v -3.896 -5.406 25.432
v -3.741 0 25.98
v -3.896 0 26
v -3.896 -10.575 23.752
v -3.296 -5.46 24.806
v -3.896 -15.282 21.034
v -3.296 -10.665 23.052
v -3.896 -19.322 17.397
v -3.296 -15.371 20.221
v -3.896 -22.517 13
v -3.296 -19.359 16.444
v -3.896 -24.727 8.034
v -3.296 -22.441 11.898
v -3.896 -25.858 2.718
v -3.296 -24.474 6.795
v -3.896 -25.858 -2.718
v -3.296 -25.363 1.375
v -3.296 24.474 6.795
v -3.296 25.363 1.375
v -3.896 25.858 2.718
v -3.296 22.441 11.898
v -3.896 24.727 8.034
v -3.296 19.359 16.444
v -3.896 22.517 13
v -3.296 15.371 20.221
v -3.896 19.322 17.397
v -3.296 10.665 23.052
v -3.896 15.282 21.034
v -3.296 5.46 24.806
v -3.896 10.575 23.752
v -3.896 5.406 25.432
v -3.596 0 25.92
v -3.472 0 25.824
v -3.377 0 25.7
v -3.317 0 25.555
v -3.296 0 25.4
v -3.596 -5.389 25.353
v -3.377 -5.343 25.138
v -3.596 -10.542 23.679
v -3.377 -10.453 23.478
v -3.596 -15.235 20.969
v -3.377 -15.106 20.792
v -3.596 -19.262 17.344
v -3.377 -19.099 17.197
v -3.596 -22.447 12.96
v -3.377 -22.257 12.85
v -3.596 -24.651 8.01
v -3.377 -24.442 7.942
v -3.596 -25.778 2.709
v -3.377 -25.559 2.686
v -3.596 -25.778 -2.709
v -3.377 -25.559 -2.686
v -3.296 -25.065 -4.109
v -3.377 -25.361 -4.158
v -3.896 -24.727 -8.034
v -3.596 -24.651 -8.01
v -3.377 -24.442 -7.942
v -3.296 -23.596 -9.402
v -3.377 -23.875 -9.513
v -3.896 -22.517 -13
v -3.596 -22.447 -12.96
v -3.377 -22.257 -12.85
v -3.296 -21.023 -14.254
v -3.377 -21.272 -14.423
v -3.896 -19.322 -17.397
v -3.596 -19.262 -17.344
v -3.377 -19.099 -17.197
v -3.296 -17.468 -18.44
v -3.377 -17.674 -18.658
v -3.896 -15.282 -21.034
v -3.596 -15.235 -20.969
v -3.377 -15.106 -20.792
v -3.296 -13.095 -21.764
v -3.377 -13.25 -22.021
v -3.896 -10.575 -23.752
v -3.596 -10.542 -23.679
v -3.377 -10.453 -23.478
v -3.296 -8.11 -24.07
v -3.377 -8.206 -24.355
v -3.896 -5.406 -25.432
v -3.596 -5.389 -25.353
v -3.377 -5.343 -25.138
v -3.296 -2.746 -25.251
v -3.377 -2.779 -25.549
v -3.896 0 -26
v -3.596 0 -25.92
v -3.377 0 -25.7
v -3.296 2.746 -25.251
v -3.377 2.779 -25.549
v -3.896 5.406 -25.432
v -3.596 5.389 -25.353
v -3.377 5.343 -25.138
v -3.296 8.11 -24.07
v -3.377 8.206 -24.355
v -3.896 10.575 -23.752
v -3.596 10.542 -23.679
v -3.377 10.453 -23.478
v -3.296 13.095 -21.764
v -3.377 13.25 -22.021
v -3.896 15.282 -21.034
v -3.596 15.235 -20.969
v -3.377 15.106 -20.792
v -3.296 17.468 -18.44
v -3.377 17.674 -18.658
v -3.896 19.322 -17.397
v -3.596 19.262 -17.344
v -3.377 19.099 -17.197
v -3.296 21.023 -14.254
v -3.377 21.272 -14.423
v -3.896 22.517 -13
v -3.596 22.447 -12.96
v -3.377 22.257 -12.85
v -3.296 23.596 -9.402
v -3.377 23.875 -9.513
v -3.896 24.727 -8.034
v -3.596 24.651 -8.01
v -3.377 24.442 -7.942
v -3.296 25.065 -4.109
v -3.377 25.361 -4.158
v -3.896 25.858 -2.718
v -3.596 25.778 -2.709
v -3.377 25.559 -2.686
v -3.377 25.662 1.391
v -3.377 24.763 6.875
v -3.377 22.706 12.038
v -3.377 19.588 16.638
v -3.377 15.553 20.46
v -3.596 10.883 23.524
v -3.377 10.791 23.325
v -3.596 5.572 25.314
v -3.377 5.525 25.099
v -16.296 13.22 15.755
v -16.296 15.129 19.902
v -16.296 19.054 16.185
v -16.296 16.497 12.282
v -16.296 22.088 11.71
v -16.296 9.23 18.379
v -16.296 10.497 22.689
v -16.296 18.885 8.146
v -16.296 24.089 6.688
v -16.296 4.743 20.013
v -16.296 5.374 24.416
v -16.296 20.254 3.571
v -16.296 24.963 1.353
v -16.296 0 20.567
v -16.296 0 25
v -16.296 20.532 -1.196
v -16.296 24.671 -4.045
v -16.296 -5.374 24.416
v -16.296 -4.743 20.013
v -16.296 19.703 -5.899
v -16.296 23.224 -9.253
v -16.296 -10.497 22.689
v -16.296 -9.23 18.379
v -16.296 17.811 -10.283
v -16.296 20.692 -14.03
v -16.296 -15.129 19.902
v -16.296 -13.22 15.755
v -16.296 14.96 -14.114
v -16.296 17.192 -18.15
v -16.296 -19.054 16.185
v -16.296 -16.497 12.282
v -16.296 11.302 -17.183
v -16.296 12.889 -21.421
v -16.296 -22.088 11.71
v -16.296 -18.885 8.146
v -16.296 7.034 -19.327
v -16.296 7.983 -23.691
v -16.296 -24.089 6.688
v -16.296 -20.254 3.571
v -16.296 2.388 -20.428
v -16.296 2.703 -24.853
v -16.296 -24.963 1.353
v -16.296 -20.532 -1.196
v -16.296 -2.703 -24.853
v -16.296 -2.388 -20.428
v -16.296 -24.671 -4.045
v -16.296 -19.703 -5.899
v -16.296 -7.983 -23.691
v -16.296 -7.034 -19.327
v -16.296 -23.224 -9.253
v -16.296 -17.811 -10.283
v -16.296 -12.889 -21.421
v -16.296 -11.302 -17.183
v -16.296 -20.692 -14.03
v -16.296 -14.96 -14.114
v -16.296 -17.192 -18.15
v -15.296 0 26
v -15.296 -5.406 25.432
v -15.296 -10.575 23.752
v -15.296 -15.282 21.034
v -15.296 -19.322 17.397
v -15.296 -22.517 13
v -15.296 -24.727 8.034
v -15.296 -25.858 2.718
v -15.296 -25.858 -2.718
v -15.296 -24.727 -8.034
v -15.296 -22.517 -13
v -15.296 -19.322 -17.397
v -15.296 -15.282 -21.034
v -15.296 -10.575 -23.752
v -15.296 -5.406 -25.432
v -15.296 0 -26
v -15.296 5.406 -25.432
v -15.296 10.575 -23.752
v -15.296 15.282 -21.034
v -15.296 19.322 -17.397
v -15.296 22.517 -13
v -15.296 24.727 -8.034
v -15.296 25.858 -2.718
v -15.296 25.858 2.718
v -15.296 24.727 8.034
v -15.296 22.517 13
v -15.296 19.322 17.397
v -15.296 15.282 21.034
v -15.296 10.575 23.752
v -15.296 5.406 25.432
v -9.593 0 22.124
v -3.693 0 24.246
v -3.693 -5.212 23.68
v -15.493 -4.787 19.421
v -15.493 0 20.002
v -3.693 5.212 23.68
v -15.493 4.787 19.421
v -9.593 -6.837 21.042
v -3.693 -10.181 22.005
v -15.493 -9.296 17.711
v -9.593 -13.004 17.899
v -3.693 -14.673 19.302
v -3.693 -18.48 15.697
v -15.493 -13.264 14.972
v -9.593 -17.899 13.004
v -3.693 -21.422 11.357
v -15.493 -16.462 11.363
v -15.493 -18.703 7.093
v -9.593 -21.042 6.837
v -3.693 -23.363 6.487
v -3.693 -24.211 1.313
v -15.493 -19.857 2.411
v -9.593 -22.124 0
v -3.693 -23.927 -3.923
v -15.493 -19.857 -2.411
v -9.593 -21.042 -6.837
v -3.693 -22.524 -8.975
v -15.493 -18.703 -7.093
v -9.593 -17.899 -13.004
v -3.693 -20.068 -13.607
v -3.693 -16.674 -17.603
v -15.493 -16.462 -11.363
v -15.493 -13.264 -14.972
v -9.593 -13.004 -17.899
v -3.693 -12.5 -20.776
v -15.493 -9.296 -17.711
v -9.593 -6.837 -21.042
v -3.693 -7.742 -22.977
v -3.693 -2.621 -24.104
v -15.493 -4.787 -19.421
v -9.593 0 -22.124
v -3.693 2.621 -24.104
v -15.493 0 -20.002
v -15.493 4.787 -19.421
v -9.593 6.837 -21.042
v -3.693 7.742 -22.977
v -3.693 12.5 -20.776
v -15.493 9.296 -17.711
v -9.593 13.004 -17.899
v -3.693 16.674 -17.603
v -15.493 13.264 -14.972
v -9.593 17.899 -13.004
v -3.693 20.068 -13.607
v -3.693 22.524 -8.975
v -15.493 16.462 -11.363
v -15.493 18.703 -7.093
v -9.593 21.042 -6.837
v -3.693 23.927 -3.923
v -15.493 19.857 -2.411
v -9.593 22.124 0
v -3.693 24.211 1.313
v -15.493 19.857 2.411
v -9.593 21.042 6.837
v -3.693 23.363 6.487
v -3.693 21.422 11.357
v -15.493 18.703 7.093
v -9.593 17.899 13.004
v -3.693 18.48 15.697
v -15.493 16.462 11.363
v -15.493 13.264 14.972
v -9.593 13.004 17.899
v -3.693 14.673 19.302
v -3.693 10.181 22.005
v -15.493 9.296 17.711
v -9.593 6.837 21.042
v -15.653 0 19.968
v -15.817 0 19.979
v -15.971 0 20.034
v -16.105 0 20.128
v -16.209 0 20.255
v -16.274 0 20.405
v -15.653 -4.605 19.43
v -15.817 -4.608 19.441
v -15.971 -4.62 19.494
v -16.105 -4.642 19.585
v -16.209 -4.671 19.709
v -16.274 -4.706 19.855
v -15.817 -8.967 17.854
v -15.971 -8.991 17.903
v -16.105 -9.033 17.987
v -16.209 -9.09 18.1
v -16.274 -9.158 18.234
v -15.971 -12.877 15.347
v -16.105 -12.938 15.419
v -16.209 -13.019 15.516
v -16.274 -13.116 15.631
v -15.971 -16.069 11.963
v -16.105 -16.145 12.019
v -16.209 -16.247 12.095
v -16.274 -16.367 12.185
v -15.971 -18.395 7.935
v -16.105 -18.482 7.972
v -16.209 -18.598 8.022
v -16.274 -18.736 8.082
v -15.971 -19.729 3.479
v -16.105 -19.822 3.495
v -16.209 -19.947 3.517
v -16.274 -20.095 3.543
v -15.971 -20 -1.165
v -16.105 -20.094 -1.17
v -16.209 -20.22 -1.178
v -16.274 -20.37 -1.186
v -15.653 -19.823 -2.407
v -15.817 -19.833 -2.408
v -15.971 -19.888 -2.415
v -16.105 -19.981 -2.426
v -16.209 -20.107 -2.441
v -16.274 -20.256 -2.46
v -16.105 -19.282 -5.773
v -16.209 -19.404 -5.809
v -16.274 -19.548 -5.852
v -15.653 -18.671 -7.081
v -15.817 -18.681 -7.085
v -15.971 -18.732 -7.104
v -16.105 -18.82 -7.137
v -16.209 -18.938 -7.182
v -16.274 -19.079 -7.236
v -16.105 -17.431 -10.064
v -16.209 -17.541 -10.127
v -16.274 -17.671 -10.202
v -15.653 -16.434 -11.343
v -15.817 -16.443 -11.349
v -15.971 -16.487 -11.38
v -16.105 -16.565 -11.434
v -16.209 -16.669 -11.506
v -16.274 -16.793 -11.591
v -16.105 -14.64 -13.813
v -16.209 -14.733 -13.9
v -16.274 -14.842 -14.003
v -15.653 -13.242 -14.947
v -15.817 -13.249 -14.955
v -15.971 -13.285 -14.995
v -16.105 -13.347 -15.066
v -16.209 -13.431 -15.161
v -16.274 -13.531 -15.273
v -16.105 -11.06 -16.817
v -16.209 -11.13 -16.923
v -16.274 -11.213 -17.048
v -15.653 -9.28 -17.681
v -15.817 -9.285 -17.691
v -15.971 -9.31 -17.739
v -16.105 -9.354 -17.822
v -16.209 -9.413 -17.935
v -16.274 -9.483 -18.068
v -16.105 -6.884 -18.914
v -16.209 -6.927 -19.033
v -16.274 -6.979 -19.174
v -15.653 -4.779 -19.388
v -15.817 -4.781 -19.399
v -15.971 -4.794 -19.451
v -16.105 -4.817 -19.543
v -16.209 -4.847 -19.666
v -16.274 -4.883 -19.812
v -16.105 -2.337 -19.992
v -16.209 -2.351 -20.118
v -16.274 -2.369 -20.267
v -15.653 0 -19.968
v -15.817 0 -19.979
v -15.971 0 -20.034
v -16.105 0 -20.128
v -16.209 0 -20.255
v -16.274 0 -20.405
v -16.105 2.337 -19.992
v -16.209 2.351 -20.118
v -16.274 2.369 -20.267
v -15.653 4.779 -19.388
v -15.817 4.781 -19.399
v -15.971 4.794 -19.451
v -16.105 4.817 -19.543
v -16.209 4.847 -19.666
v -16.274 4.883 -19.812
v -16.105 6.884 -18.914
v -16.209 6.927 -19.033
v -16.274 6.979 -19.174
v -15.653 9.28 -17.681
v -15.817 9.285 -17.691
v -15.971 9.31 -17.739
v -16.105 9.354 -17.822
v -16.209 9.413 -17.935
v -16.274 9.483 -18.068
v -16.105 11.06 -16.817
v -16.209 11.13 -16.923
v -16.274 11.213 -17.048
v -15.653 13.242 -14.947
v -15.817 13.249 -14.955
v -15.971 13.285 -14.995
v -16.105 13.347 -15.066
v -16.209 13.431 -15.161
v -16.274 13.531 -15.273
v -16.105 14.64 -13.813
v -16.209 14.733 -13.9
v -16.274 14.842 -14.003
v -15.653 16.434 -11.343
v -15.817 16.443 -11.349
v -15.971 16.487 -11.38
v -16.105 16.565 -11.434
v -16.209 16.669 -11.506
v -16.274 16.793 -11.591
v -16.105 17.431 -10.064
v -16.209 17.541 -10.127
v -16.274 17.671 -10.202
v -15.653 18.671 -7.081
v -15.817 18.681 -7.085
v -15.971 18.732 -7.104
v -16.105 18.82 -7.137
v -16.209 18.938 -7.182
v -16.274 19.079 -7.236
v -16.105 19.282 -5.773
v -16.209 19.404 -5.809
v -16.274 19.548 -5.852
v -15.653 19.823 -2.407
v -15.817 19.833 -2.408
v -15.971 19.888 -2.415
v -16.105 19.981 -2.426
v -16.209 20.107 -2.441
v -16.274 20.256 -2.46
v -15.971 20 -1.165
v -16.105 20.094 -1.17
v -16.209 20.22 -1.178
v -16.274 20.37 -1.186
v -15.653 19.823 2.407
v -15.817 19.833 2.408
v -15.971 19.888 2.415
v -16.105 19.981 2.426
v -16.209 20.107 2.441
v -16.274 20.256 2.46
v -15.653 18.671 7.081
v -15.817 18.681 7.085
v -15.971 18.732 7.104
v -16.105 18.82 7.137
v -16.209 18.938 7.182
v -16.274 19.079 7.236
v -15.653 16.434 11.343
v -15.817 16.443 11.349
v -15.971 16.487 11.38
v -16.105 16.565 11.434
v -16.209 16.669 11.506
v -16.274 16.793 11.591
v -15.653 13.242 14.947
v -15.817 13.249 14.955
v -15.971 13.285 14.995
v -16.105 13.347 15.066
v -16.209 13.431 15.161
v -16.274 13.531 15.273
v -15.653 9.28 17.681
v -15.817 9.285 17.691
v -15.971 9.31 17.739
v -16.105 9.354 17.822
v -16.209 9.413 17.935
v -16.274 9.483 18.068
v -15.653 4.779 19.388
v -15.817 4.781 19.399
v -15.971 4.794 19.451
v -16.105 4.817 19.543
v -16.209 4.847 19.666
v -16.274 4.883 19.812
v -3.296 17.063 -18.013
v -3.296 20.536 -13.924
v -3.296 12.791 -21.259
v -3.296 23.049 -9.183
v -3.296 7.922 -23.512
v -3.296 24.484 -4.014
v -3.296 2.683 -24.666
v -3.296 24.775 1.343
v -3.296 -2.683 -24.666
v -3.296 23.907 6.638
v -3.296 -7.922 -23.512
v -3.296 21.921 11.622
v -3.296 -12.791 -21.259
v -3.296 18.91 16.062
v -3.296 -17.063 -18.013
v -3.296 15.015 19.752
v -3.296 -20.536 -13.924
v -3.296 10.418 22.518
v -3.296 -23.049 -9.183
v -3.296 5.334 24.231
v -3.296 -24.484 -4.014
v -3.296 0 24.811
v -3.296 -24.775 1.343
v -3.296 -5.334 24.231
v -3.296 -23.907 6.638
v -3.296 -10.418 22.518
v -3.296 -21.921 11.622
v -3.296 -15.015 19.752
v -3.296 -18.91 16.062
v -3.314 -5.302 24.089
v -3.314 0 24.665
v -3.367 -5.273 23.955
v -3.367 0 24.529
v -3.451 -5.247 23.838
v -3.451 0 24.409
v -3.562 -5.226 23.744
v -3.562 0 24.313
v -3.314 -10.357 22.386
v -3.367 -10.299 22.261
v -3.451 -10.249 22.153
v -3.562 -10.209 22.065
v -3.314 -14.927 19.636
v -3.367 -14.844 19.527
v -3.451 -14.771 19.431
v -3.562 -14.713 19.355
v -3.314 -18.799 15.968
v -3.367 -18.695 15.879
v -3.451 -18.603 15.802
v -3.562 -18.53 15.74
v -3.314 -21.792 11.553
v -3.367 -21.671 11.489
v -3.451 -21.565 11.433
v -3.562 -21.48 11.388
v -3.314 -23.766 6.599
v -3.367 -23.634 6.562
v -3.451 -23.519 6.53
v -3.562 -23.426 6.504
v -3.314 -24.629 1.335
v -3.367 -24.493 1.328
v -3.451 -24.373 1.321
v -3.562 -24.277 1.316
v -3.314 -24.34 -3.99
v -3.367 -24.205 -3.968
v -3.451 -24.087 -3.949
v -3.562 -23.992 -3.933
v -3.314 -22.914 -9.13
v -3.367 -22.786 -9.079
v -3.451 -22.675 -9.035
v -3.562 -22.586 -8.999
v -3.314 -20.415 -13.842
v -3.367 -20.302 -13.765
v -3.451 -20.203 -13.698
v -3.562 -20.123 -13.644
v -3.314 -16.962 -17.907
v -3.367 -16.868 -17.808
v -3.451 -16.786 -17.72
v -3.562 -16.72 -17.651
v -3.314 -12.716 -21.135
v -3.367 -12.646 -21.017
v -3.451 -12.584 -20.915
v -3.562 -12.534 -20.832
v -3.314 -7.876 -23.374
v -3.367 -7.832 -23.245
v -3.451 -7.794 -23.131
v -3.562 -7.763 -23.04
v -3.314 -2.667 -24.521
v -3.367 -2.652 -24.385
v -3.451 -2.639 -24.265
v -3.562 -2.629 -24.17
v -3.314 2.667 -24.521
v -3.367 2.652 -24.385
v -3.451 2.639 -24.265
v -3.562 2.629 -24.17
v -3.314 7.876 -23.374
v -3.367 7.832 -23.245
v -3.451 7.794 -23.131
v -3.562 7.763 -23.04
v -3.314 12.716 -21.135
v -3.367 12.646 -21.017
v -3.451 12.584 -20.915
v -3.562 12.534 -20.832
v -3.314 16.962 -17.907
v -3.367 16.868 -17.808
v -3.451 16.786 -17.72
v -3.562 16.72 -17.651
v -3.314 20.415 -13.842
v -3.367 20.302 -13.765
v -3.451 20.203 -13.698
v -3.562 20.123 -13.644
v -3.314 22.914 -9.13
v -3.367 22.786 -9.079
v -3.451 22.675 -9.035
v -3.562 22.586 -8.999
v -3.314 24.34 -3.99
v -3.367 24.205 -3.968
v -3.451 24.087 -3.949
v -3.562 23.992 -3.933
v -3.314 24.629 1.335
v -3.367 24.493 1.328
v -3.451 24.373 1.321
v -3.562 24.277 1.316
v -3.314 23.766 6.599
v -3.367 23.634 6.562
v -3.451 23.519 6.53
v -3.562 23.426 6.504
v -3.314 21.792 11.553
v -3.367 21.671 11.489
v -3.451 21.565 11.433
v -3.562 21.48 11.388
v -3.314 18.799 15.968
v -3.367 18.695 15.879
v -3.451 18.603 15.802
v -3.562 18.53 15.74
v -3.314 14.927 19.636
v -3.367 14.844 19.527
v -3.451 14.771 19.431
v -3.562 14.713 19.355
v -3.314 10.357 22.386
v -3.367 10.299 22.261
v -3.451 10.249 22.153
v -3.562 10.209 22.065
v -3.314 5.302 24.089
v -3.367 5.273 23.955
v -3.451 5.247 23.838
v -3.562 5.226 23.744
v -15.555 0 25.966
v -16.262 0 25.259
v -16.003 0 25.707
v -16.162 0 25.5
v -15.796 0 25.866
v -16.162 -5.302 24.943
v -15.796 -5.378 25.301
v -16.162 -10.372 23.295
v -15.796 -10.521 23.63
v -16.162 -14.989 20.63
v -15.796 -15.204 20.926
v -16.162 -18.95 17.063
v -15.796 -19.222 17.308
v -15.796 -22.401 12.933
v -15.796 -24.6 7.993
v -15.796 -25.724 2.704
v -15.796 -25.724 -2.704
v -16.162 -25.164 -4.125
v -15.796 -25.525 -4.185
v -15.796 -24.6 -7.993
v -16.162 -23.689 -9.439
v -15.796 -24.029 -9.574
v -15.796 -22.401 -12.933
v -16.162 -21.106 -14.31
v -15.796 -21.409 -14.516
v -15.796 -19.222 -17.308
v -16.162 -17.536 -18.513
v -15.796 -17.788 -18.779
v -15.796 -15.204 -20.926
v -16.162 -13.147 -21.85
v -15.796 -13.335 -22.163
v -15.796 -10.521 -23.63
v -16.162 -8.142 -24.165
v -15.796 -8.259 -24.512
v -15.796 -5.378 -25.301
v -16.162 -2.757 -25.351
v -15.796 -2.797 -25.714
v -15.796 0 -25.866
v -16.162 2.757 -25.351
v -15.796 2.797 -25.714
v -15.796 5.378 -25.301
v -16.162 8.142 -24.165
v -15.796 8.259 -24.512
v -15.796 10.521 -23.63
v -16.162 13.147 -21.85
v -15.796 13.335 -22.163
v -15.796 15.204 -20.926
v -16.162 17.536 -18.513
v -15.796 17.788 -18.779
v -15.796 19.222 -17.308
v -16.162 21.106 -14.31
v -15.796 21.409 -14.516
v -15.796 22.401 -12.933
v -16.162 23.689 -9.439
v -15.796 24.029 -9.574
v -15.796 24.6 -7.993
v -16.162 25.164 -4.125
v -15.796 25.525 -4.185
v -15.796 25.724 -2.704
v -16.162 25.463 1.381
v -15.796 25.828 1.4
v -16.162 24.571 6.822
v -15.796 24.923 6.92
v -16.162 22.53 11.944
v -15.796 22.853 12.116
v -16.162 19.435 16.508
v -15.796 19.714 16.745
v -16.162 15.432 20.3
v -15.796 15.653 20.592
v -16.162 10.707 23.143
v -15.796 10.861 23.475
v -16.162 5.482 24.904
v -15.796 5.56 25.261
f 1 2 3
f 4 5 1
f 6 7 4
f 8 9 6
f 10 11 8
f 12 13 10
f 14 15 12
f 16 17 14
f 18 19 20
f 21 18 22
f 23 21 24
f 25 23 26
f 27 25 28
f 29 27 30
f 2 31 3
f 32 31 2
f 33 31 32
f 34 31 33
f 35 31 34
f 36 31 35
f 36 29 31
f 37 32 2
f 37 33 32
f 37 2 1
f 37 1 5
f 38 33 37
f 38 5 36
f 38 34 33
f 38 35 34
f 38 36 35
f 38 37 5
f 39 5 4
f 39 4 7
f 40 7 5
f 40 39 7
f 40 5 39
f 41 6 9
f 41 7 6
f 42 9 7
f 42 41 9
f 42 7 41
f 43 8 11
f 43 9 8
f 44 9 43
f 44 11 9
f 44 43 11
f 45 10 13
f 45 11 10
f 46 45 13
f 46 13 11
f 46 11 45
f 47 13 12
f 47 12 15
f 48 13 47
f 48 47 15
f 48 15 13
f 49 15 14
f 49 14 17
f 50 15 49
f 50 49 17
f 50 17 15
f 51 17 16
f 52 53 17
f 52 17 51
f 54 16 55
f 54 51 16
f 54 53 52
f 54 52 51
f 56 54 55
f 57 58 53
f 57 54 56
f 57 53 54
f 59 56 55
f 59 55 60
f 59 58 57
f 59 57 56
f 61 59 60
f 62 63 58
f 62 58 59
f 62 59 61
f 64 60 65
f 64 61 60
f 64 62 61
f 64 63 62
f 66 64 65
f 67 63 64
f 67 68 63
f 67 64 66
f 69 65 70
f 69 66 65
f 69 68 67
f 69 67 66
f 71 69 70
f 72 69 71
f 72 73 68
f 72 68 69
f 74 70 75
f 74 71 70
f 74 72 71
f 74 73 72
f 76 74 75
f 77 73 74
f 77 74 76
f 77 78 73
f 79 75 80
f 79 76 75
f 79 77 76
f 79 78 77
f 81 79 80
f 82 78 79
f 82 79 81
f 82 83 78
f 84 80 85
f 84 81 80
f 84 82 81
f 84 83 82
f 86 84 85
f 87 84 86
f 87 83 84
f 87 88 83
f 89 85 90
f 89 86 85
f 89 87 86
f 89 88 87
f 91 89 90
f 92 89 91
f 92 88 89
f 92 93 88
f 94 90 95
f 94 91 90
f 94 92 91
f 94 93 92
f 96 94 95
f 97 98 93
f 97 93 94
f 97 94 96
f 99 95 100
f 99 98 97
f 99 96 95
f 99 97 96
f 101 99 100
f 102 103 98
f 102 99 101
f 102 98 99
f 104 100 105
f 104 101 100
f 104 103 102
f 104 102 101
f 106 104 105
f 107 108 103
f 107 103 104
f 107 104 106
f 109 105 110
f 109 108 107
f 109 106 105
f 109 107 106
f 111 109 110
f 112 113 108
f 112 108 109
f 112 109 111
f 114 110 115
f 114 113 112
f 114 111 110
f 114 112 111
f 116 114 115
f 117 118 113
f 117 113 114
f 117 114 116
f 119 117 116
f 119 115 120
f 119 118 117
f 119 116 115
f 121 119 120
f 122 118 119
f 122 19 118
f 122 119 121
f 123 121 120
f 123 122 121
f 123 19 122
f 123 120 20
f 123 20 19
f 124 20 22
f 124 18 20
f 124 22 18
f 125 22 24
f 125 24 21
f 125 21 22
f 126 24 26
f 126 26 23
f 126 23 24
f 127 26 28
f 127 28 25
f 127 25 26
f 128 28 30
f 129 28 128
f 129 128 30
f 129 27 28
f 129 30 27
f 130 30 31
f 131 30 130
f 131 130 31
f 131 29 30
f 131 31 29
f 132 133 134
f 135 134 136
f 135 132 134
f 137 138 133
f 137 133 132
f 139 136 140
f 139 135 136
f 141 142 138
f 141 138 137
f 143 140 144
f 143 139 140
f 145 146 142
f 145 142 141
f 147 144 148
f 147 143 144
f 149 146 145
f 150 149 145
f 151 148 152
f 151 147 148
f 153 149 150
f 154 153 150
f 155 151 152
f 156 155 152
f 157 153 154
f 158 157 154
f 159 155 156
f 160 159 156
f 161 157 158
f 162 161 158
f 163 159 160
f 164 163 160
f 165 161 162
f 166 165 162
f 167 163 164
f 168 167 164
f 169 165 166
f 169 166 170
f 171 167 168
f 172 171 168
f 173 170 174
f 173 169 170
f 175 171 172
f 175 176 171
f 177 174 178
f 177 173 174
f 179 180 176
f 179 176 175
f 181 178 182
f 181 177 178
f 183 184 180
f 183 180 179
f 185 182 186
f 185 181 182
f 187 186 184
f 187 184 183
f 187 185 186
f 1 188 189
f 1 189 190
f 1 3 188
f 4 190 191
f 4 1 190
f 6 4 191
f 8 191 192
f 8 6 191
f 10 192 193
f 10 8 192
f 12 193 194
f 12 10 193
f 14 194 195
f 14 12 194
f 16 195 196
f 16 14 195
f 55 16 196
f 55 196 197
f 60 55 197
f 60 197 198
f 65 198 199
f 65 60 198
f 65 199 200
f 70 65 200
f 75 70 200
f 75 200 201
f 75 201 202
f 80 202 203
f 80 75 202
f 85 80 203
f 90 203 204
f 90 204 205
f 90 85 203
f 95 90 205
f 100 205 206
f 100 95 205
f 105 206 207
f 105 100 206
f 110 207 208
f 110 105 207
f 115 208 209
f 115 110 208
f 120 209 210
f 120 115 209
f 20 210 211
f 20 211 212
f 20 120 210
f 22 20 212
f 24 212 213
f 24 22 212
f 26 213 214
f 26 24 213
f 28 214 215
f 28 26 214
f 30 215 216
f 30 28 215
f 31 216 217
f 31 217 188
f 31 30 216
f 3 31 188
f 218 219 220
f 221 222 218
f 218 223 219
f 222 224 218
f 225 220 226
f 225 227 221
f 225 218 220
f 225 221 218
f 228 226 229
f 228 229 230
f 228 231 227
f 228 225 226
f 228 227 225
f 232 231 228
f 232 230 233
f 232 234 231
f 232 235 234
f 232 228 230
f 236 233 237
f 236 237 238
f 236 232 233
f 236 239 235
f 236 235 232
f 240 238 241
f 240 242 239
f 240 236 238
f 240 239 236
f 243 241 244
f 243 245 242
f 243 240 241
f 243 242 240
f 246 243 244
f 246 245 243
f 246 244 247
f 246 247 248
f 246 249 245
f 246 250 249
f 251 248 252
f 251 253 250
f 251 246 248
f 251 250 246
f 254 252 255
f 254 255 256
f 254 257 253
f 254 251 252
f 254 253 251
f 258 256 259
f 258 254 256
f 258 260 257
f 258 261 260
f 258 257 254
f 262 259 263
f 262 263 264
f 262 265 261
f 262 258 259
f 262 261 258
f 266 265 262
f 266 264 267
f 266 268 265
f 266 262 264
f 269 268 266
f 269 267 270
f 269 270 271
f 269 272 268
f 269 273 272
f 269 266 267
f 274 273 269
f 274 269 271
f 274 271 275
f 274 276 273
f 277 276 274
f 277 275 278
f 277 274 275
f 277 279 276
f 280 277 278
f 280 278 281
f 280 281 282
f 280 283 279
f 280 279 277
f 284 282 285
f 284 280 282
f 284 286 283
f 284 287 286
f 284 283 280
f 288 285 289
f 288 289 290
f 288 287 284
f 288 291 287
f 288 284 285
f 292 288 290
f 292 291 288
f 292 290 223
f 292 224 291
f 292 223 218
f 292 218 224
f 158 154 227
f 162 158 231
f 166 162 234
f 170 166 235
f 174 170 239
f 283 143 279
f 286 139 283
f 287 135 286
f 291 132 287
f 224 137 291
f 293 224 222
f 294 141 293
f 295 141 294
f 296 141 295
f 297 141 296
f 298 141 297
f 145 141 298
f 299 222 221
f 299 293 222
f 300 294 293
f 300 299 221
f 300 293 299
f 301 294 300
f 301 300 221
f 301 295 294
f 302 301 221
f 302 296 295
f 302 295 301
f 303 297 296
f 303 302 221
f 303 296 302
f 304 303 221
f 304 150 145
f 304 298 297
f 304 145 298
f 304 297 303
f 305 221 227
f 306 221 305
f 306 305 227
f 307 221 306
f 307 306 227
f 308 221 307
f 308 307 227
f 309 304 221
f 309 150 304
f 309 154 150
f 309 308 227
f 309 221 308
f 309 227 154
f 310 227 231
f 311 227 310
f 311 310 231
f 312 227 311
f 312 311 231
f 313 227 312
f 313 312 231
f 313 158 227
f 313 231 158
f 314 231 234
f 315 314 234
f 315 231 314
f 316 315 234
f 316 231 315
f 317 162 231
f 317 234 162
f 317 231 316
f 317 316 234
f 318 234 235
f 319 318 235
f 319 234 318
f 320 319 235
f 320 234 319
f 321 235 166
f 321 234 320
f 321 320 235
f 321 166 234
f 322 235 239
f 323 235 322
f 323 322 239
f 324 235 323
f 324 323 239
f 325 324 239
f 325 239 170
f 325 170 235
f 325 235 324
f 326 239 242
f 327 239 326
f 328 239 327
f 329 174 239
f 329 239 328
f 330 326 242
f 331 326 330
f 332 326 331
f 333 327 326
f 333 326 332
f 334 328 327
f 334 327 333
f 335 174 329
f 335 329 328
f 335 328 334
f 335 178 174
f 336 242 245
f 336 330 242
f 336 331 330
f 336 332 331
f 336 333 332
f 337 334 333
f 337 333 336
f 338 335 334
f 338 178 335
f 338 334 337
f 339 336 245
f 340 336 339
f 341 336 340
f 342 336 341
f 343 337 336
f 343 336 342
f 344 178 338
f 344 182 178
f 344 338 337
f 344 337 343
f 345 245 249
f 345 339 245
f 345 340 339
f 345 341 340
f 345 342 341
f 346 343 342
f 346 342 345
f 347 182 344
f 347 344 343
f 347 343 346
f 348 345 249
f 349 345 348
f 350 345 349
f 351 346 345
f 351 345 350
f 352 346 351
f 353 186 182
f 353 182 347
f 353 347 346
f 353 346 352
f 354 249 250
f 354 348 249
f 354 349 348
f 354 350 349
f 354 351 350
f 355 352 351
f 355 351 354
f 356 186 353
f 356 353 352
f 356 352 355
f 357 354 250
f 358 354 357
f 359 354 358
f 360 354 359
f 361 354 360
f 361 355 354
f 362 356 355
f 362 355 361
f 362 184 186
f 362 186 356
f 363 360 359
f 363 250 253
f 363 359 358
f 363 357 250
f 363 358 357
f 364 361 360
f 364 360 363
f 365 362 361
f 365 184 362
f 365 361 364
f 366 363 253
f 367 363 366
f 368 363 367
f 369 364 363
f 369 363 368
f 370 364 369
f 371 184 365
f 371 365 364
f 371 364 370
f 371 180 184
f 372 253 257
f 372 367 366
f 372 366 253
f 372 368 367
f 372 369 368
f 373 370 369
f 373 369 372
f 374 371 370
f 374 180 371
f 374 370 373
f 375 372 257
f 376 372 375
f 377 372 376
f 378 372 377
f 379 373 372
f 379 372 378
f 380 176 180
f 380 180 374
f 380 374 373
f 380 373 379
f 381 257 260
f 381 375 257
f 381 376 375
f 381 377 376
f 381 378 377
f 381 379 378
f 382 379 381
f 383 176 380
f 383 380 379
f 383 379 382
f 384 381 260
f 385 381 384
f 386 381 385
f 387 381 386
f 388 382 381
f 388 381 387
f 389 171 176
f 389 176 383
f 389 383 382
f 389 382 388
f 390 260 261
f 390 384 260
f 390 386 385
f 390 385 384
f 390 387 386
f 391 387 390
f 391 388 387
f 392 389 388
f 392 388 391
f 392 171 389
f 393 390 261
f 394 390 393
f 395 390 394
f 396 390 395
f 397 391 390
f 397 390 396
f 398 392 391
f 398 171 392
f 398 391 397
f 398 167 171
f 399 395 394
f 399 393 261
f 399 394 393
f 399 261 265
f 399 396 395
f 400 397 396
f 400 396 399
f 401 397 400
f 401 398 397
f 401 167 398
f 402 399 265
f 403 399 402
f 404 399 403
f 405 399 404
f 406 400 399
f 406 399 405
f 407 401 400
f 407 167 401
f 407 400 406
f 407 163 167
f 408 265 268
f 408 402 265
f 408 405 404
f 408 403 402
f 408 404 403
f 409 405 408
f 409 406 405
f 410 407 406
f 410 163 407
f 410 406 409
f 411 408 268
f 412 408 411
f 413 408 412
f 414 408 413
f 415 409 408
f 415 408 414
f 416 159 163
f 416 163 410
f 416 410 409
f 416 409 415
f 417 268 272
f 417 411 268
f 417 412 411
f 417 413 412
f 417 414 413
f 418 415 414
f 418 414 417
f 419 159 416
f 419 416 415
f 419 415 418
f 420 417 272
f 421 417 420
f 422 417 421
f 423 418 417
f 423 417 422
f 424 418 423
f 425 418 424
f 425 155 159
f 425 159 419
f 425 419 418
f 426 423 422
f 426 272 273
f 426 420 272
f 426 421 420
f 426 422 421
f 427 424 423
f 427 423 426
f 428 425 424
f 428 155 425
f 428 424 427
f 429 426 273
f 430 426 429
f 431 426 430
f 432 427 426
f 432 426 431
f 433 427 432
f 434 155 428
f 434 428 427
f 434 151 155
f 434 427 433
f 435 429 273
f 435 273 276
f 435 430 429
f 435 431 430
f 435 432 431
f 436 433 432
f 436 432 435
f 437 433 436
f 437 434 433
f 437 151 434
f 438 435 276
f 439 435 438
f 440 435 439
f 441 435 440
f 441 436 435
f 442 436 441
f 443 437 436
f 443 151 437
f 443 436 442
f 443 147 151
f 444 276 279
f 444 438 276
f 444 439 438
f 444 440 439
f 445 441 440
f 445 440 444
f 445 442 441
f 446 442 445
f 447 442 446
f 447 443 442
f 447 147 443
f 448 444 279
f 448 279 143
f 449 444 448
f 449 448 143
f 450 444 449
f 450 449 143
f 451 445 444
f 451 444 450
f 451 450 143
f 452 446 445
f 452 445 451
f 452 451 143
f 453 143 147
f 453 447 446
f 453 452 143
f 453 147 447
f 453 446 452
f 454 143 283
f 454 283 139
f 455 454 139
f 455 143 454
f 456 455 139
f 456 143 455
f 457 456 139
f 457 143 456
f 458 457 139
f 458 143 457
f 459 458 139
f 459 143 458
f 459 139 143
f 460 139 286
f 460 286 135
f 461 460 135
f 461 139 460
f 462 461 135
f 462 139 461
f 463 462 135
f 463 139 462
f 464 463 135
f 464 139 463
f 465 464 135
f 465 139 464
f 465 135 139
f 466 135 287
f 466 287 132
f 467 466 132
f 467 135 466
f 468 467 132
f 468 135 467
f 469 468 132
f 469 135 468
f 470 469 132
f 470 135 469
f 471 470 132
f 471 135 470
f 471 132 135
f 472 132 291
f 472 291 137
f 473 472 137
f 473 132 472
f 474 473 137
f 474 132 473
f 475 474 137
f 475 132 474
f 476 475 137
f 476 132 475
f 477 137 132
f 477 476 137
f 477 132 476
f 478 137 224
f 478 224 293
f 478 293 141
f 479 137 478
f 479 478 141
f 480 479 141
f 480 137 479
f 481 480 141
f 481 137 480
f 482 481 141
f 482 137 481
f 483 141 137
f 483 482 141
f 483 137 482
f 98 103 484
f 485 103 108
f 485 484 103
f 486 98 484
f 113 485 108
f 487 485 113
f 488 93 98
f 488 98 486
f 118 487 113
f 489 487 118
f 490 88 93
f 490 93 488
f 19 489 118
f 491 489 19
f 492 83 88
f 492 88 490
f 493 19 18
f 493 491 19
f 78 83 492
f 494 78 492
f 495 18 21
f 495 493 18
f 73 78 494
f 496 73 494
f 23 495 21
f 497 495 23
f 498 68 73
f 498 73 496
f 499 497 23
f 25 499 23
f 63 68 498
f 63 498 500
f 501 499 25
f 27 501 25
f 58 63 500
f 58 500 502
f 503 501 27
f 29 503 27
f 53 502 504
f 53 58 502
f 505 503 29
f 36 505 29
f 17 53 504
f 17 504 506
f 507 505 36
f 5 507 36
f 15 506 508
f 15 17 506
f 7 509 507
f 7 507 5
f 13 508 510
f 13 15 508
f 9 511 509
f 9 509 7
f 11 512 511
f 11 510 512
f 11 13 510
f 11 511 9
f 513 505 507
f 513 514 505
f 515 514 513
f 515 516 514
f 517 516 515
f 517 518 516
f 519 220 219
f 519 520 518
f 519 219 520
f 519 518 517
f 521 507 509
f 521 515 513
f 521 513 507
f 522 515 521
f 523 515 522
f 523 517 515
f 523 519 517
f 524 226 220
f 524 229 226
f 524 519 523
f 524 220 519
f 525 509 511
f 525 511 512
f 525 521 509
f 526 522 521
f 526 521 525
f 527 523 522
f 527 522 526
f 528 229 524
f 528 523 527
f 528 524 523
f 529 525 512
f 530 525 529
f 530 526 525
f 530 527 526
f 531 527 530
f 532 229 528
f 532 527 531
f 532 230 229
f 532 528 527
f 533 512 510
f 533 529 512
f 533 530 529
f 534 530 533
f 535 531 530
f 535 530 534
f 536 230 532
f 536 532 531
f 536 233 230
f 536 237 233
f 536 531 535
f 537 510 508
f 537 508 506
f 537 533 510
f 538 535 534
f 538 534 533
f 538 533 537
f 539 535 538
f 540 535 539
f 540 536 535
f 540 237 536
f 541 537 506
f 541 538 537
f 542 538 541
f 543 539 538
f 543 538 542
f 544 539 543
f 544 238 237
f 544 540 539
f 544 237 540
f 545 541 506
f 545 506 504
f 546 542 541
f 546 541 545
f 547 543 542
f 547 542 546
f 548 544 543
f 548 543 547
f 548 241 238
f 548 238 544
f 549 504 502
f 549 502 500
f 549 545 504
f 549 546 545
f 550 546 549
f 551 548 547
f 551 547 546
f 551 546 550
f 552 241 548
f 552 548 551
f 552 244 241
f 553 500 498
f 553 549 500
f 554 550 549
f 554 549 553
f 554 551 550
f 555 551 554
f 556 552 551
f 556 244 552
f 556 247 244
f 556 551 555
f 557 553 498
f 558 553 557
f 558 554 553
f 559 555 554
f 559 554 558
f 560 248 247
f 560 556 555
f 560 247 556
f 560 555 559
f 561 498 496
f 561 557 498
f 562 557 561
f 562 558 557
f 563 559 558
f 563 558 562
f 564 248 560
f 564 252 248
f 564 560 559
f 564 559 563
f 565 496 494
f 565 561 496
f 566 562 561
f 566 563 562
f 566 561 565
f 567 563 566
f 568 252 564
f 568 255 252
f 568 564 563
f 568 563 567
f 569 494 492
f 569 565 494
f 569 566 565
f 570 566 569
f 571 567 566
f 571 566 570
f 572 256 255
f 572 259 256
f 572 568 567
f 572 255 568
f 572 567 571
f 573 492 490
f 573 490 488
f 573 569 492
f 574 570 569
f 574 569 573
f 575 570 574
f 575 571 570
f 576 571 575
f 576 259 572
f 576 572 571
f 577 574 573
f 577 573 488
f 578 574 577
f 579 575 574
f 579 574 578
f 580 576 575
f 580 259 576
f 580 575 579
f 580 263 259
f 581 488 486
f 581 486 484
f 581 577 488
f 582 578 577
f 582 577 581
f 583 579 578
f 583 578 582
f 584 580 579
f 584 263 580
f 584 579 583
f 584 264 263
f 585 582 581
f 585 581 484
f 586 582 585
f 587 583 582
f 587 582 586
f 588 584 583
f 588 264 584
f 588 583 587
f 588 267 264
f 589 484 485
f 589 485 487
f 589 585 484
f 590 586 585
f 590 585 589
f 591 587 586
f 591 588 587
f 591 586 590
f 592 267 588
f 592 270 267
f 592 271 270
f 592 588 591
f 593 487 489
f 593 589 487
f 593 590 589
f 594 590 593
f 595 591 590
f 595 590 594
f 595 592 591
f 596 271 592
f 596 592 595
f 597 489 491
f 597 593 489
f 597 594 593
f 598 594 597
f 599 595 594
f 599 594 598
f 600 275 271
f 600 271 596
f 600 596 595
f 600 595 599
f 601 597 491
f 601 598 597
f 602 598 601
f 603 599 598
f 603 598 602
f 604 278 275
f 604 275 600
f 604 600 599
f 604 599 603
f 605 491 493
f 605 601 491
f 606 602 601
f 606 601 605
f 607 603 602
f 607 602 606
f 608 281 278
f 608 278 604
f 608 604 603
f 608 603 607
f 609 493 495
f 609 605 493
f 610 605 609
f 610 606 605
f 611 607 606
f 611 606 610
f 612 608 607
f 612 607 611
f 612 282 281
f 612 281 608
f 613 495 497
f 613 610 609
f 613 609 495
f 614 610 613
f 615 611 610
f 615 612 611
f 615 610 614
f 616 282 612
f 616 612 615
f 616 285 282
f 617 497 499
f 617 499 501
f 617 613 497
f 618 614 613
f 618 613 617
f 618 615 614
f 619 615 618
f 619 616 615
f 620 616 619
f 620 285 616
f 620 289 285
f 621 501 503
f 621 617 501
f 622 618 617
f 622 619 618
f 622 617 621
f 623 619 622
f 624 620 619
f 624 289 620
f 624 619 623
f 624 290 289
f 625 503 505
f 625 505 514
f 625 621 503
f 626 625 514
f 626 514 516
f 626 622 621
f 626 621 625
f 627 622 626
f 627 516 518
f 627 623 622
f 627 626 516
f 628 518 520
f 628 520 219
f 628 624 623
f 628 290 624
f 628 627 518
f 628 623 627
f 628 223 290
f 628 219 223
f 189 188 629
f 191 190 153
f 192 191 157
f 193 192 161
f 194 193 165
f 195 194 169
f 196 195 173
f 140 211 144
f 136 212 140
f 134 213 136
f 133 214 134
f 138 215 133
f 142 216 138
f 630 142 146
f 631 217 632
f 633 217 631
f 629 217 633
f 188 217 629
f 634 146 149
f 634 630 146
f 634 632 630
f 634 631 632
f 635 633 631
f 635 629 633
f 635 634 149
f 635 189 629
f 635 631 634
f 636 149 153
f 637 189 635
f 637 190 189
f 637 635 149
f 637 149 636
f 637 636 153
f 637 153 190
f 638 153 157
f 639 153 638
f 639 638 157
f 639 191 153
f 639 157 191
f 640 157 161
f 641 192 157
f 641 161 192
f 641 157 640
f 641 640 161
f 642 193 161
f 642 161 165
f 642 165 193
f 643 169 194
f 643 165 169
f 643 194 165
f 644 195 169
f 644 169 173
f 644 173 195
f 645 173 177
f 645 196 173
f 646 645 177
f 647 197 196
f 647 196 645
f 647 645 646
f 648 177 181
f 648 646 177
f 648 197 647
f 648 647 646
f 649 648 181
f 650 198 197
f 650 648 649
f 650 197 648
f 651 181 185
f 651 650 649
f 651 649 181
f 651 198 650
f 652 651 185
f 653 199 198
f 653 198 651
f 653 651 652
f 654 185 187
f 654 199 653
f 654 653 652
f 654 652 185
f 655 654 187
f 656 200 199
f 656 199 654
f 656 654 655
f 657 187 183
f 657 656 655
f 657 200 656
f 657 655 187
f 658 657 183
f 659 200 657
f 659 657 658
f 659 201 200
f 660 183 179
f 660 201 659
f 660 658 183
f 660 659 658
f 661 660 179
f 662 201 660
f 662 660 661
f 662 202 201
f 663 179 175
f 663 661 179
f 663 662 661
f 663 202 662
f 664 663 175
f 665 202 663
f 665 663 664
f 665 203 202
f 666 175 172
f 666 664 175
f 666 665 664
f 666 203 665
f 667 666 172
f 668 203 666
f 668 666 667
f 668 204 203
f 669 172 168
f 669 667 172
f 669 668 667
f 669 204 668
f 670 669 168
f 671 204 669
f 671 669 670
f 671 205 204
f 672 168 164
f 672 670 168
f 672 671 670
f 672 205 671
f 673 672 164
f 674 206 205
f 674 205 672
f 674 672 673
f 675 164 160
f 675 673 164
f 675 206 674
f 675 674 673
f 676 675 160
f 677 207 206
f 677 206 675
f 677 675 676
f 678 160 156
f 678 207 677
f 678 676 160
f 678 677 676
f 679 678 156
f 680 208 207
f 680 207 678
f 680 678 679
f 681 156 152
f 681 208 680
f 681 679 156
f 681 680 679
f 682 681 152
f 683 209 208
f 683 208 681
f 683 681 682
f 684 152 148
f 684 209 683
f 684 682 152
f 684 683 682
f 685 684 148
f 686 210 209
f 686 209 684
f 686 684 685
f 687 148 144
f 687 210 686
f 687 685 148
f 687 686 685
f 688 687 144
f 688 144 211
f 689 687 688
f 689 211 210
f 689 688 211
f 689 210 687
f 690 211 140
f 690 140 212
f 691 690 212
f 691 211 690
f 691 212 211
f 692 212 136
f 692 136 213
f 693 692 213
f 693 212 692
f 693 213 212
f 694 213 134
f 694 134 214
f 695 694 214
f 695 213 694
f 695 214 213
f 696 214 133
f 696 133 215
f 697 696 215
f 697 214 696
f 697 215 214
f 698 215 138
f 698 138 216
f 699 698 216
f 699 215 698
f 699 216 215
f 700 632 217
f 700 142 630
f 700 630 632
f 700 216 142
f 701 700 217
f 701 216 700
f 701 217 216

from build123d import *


with BuildPart() as part:
    # Esquisse1 → Base-Révolution (revolve)
    with BuildSketch(Plane.XY, mode=Mode.PRIVATE) as base_r_volution_sk:
        with BuildLine():
            Line((-15.29638585, 26), (-3.89638585, 26))
            ThreePointArc((-3.89638585, 26), (-3.472121782, 25.824264069), (-3.29638585, 25.4))
            Line((-3.29638585, 25.4), (-3.29638585, 24.811004735))
            ThreePointArc((-3.29638585, 24.811004735), (-3.405550409, 24.465924209), (-3.693321081, 24.246412227))
            Line((-3.693321081, 24.246412227), (-15.493321081, 20.002352589))
            ThreePointArc((-15.493321081, 20.002352589), (-16.041466376, 20.076109655), (-16.29638585, 20.566945096))
            Line((-16.29638585, 20.566945096), (-16.29638585, 25))
            ThreePointArc((-16.29638585, 25), (-16.003492631, 25.707106781), (-15.29638585, 26))
        make_face()
    revolve(base_r_volution_sk.sketch.rotate(Axis((-17.990056753, 0, 0), (1, 0, 0)), 90), axis=Axis((-17.990056753, 0, 0), (1, 0, 0)))


solid = part.part
